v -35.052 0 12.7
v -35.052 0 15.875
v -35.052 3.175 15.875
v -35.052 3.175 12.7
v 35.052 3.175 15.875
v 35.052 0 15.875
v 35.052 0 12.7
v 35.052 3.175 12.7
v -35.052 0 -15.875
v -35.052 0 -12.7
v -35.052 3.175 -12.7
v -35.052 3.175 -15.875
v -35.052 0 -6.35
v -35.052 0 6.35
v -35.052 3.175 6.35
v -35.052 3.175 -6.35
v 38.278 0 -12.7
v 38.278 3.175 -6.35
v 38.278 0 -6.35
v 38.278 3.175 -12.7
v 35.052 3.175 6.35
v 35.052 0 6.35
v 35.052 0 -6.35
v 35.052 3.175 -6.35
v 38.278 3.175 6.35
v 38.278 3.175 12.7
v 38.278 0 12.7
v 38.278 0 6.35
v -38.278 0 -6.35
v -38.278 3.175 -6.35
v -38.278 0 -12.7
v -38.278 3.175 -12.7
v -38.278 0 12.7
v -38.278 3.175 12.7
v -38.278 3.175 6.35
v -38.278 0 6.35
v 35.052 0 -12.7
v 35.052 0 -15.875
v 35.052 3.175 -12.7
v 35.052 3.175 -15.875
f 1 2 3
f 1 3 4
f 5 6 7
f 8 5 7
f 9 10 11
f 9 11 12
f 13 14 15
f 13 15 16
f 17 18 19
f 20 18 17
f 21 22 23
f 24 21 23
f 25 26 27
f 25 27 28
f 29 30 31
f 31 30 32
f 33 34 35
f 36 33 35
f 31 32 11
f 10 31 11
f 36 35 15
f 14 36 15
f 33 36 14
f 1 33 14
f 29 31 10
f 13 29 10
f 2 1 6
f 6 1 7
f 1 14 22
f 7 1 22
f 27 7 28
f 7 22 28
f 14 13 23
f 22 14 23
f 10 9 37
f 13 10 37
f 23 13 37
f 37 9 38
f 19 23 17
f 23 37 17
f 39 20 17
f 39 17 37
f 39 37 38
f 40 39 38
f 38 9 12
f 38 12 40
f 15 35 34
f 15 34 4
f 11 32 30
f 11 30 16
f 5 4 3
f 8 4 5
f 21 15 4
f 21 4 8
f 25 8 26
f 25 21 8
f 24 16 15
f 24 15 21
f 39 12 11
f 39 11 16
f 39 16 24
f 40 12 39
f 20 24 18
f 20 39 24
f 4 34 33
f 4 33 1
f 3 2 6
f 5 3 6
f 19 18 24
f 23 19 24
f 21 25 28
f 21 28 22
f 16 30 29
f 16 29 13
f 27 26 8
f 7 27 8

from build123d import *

# Parameters (mm, degrees)
SKETCH1_W           = 70.104
SKETCH1_H           = 31.75
BOSS_EXTRUDE1_DEPTH = 3.175
SKETCH2_W           = 3.2258
SKETCH2_H           = 6.35
TABS_DEPTH          = 3.175


with BuildPart() as part:
    # Sketch1 → Boss-Extrude1 (new body)
    with BuildSketch(Plane(origin=(0, 0, 0), x_dir=(1, 0, 0), z_dir=(0, 1, 0))):
        Rectangle(SKETCH1_W, SKETCH1_H)
    extrude(amount=BOSS_EXTRUDE1_DEPTH)

    # Sketch2 → tabs (add)
    with BuildSketch(Plane(origin=(0, 3.175, 0), x_dir=(1, 0, 0), z_dir=(0, 1, 0))):
        with Locations((-36.6649, 9.525)):
            Rectangle(SKETCH2_W, SKETCH2_H)
        with Locations((-36.6649, -9.525)):
            Rectangle(SKETCH2_W, SKETCH2_H)
    tabs = extrude(amount=-TABS_DEPTH)

    # Mirror1: tabs across plane
    add(tabs.mirror(Plane(origin=(0, 0, 0), x_dir=(0, 0, 1), z_dir=(1, 0, 0))))


solid = part.part
